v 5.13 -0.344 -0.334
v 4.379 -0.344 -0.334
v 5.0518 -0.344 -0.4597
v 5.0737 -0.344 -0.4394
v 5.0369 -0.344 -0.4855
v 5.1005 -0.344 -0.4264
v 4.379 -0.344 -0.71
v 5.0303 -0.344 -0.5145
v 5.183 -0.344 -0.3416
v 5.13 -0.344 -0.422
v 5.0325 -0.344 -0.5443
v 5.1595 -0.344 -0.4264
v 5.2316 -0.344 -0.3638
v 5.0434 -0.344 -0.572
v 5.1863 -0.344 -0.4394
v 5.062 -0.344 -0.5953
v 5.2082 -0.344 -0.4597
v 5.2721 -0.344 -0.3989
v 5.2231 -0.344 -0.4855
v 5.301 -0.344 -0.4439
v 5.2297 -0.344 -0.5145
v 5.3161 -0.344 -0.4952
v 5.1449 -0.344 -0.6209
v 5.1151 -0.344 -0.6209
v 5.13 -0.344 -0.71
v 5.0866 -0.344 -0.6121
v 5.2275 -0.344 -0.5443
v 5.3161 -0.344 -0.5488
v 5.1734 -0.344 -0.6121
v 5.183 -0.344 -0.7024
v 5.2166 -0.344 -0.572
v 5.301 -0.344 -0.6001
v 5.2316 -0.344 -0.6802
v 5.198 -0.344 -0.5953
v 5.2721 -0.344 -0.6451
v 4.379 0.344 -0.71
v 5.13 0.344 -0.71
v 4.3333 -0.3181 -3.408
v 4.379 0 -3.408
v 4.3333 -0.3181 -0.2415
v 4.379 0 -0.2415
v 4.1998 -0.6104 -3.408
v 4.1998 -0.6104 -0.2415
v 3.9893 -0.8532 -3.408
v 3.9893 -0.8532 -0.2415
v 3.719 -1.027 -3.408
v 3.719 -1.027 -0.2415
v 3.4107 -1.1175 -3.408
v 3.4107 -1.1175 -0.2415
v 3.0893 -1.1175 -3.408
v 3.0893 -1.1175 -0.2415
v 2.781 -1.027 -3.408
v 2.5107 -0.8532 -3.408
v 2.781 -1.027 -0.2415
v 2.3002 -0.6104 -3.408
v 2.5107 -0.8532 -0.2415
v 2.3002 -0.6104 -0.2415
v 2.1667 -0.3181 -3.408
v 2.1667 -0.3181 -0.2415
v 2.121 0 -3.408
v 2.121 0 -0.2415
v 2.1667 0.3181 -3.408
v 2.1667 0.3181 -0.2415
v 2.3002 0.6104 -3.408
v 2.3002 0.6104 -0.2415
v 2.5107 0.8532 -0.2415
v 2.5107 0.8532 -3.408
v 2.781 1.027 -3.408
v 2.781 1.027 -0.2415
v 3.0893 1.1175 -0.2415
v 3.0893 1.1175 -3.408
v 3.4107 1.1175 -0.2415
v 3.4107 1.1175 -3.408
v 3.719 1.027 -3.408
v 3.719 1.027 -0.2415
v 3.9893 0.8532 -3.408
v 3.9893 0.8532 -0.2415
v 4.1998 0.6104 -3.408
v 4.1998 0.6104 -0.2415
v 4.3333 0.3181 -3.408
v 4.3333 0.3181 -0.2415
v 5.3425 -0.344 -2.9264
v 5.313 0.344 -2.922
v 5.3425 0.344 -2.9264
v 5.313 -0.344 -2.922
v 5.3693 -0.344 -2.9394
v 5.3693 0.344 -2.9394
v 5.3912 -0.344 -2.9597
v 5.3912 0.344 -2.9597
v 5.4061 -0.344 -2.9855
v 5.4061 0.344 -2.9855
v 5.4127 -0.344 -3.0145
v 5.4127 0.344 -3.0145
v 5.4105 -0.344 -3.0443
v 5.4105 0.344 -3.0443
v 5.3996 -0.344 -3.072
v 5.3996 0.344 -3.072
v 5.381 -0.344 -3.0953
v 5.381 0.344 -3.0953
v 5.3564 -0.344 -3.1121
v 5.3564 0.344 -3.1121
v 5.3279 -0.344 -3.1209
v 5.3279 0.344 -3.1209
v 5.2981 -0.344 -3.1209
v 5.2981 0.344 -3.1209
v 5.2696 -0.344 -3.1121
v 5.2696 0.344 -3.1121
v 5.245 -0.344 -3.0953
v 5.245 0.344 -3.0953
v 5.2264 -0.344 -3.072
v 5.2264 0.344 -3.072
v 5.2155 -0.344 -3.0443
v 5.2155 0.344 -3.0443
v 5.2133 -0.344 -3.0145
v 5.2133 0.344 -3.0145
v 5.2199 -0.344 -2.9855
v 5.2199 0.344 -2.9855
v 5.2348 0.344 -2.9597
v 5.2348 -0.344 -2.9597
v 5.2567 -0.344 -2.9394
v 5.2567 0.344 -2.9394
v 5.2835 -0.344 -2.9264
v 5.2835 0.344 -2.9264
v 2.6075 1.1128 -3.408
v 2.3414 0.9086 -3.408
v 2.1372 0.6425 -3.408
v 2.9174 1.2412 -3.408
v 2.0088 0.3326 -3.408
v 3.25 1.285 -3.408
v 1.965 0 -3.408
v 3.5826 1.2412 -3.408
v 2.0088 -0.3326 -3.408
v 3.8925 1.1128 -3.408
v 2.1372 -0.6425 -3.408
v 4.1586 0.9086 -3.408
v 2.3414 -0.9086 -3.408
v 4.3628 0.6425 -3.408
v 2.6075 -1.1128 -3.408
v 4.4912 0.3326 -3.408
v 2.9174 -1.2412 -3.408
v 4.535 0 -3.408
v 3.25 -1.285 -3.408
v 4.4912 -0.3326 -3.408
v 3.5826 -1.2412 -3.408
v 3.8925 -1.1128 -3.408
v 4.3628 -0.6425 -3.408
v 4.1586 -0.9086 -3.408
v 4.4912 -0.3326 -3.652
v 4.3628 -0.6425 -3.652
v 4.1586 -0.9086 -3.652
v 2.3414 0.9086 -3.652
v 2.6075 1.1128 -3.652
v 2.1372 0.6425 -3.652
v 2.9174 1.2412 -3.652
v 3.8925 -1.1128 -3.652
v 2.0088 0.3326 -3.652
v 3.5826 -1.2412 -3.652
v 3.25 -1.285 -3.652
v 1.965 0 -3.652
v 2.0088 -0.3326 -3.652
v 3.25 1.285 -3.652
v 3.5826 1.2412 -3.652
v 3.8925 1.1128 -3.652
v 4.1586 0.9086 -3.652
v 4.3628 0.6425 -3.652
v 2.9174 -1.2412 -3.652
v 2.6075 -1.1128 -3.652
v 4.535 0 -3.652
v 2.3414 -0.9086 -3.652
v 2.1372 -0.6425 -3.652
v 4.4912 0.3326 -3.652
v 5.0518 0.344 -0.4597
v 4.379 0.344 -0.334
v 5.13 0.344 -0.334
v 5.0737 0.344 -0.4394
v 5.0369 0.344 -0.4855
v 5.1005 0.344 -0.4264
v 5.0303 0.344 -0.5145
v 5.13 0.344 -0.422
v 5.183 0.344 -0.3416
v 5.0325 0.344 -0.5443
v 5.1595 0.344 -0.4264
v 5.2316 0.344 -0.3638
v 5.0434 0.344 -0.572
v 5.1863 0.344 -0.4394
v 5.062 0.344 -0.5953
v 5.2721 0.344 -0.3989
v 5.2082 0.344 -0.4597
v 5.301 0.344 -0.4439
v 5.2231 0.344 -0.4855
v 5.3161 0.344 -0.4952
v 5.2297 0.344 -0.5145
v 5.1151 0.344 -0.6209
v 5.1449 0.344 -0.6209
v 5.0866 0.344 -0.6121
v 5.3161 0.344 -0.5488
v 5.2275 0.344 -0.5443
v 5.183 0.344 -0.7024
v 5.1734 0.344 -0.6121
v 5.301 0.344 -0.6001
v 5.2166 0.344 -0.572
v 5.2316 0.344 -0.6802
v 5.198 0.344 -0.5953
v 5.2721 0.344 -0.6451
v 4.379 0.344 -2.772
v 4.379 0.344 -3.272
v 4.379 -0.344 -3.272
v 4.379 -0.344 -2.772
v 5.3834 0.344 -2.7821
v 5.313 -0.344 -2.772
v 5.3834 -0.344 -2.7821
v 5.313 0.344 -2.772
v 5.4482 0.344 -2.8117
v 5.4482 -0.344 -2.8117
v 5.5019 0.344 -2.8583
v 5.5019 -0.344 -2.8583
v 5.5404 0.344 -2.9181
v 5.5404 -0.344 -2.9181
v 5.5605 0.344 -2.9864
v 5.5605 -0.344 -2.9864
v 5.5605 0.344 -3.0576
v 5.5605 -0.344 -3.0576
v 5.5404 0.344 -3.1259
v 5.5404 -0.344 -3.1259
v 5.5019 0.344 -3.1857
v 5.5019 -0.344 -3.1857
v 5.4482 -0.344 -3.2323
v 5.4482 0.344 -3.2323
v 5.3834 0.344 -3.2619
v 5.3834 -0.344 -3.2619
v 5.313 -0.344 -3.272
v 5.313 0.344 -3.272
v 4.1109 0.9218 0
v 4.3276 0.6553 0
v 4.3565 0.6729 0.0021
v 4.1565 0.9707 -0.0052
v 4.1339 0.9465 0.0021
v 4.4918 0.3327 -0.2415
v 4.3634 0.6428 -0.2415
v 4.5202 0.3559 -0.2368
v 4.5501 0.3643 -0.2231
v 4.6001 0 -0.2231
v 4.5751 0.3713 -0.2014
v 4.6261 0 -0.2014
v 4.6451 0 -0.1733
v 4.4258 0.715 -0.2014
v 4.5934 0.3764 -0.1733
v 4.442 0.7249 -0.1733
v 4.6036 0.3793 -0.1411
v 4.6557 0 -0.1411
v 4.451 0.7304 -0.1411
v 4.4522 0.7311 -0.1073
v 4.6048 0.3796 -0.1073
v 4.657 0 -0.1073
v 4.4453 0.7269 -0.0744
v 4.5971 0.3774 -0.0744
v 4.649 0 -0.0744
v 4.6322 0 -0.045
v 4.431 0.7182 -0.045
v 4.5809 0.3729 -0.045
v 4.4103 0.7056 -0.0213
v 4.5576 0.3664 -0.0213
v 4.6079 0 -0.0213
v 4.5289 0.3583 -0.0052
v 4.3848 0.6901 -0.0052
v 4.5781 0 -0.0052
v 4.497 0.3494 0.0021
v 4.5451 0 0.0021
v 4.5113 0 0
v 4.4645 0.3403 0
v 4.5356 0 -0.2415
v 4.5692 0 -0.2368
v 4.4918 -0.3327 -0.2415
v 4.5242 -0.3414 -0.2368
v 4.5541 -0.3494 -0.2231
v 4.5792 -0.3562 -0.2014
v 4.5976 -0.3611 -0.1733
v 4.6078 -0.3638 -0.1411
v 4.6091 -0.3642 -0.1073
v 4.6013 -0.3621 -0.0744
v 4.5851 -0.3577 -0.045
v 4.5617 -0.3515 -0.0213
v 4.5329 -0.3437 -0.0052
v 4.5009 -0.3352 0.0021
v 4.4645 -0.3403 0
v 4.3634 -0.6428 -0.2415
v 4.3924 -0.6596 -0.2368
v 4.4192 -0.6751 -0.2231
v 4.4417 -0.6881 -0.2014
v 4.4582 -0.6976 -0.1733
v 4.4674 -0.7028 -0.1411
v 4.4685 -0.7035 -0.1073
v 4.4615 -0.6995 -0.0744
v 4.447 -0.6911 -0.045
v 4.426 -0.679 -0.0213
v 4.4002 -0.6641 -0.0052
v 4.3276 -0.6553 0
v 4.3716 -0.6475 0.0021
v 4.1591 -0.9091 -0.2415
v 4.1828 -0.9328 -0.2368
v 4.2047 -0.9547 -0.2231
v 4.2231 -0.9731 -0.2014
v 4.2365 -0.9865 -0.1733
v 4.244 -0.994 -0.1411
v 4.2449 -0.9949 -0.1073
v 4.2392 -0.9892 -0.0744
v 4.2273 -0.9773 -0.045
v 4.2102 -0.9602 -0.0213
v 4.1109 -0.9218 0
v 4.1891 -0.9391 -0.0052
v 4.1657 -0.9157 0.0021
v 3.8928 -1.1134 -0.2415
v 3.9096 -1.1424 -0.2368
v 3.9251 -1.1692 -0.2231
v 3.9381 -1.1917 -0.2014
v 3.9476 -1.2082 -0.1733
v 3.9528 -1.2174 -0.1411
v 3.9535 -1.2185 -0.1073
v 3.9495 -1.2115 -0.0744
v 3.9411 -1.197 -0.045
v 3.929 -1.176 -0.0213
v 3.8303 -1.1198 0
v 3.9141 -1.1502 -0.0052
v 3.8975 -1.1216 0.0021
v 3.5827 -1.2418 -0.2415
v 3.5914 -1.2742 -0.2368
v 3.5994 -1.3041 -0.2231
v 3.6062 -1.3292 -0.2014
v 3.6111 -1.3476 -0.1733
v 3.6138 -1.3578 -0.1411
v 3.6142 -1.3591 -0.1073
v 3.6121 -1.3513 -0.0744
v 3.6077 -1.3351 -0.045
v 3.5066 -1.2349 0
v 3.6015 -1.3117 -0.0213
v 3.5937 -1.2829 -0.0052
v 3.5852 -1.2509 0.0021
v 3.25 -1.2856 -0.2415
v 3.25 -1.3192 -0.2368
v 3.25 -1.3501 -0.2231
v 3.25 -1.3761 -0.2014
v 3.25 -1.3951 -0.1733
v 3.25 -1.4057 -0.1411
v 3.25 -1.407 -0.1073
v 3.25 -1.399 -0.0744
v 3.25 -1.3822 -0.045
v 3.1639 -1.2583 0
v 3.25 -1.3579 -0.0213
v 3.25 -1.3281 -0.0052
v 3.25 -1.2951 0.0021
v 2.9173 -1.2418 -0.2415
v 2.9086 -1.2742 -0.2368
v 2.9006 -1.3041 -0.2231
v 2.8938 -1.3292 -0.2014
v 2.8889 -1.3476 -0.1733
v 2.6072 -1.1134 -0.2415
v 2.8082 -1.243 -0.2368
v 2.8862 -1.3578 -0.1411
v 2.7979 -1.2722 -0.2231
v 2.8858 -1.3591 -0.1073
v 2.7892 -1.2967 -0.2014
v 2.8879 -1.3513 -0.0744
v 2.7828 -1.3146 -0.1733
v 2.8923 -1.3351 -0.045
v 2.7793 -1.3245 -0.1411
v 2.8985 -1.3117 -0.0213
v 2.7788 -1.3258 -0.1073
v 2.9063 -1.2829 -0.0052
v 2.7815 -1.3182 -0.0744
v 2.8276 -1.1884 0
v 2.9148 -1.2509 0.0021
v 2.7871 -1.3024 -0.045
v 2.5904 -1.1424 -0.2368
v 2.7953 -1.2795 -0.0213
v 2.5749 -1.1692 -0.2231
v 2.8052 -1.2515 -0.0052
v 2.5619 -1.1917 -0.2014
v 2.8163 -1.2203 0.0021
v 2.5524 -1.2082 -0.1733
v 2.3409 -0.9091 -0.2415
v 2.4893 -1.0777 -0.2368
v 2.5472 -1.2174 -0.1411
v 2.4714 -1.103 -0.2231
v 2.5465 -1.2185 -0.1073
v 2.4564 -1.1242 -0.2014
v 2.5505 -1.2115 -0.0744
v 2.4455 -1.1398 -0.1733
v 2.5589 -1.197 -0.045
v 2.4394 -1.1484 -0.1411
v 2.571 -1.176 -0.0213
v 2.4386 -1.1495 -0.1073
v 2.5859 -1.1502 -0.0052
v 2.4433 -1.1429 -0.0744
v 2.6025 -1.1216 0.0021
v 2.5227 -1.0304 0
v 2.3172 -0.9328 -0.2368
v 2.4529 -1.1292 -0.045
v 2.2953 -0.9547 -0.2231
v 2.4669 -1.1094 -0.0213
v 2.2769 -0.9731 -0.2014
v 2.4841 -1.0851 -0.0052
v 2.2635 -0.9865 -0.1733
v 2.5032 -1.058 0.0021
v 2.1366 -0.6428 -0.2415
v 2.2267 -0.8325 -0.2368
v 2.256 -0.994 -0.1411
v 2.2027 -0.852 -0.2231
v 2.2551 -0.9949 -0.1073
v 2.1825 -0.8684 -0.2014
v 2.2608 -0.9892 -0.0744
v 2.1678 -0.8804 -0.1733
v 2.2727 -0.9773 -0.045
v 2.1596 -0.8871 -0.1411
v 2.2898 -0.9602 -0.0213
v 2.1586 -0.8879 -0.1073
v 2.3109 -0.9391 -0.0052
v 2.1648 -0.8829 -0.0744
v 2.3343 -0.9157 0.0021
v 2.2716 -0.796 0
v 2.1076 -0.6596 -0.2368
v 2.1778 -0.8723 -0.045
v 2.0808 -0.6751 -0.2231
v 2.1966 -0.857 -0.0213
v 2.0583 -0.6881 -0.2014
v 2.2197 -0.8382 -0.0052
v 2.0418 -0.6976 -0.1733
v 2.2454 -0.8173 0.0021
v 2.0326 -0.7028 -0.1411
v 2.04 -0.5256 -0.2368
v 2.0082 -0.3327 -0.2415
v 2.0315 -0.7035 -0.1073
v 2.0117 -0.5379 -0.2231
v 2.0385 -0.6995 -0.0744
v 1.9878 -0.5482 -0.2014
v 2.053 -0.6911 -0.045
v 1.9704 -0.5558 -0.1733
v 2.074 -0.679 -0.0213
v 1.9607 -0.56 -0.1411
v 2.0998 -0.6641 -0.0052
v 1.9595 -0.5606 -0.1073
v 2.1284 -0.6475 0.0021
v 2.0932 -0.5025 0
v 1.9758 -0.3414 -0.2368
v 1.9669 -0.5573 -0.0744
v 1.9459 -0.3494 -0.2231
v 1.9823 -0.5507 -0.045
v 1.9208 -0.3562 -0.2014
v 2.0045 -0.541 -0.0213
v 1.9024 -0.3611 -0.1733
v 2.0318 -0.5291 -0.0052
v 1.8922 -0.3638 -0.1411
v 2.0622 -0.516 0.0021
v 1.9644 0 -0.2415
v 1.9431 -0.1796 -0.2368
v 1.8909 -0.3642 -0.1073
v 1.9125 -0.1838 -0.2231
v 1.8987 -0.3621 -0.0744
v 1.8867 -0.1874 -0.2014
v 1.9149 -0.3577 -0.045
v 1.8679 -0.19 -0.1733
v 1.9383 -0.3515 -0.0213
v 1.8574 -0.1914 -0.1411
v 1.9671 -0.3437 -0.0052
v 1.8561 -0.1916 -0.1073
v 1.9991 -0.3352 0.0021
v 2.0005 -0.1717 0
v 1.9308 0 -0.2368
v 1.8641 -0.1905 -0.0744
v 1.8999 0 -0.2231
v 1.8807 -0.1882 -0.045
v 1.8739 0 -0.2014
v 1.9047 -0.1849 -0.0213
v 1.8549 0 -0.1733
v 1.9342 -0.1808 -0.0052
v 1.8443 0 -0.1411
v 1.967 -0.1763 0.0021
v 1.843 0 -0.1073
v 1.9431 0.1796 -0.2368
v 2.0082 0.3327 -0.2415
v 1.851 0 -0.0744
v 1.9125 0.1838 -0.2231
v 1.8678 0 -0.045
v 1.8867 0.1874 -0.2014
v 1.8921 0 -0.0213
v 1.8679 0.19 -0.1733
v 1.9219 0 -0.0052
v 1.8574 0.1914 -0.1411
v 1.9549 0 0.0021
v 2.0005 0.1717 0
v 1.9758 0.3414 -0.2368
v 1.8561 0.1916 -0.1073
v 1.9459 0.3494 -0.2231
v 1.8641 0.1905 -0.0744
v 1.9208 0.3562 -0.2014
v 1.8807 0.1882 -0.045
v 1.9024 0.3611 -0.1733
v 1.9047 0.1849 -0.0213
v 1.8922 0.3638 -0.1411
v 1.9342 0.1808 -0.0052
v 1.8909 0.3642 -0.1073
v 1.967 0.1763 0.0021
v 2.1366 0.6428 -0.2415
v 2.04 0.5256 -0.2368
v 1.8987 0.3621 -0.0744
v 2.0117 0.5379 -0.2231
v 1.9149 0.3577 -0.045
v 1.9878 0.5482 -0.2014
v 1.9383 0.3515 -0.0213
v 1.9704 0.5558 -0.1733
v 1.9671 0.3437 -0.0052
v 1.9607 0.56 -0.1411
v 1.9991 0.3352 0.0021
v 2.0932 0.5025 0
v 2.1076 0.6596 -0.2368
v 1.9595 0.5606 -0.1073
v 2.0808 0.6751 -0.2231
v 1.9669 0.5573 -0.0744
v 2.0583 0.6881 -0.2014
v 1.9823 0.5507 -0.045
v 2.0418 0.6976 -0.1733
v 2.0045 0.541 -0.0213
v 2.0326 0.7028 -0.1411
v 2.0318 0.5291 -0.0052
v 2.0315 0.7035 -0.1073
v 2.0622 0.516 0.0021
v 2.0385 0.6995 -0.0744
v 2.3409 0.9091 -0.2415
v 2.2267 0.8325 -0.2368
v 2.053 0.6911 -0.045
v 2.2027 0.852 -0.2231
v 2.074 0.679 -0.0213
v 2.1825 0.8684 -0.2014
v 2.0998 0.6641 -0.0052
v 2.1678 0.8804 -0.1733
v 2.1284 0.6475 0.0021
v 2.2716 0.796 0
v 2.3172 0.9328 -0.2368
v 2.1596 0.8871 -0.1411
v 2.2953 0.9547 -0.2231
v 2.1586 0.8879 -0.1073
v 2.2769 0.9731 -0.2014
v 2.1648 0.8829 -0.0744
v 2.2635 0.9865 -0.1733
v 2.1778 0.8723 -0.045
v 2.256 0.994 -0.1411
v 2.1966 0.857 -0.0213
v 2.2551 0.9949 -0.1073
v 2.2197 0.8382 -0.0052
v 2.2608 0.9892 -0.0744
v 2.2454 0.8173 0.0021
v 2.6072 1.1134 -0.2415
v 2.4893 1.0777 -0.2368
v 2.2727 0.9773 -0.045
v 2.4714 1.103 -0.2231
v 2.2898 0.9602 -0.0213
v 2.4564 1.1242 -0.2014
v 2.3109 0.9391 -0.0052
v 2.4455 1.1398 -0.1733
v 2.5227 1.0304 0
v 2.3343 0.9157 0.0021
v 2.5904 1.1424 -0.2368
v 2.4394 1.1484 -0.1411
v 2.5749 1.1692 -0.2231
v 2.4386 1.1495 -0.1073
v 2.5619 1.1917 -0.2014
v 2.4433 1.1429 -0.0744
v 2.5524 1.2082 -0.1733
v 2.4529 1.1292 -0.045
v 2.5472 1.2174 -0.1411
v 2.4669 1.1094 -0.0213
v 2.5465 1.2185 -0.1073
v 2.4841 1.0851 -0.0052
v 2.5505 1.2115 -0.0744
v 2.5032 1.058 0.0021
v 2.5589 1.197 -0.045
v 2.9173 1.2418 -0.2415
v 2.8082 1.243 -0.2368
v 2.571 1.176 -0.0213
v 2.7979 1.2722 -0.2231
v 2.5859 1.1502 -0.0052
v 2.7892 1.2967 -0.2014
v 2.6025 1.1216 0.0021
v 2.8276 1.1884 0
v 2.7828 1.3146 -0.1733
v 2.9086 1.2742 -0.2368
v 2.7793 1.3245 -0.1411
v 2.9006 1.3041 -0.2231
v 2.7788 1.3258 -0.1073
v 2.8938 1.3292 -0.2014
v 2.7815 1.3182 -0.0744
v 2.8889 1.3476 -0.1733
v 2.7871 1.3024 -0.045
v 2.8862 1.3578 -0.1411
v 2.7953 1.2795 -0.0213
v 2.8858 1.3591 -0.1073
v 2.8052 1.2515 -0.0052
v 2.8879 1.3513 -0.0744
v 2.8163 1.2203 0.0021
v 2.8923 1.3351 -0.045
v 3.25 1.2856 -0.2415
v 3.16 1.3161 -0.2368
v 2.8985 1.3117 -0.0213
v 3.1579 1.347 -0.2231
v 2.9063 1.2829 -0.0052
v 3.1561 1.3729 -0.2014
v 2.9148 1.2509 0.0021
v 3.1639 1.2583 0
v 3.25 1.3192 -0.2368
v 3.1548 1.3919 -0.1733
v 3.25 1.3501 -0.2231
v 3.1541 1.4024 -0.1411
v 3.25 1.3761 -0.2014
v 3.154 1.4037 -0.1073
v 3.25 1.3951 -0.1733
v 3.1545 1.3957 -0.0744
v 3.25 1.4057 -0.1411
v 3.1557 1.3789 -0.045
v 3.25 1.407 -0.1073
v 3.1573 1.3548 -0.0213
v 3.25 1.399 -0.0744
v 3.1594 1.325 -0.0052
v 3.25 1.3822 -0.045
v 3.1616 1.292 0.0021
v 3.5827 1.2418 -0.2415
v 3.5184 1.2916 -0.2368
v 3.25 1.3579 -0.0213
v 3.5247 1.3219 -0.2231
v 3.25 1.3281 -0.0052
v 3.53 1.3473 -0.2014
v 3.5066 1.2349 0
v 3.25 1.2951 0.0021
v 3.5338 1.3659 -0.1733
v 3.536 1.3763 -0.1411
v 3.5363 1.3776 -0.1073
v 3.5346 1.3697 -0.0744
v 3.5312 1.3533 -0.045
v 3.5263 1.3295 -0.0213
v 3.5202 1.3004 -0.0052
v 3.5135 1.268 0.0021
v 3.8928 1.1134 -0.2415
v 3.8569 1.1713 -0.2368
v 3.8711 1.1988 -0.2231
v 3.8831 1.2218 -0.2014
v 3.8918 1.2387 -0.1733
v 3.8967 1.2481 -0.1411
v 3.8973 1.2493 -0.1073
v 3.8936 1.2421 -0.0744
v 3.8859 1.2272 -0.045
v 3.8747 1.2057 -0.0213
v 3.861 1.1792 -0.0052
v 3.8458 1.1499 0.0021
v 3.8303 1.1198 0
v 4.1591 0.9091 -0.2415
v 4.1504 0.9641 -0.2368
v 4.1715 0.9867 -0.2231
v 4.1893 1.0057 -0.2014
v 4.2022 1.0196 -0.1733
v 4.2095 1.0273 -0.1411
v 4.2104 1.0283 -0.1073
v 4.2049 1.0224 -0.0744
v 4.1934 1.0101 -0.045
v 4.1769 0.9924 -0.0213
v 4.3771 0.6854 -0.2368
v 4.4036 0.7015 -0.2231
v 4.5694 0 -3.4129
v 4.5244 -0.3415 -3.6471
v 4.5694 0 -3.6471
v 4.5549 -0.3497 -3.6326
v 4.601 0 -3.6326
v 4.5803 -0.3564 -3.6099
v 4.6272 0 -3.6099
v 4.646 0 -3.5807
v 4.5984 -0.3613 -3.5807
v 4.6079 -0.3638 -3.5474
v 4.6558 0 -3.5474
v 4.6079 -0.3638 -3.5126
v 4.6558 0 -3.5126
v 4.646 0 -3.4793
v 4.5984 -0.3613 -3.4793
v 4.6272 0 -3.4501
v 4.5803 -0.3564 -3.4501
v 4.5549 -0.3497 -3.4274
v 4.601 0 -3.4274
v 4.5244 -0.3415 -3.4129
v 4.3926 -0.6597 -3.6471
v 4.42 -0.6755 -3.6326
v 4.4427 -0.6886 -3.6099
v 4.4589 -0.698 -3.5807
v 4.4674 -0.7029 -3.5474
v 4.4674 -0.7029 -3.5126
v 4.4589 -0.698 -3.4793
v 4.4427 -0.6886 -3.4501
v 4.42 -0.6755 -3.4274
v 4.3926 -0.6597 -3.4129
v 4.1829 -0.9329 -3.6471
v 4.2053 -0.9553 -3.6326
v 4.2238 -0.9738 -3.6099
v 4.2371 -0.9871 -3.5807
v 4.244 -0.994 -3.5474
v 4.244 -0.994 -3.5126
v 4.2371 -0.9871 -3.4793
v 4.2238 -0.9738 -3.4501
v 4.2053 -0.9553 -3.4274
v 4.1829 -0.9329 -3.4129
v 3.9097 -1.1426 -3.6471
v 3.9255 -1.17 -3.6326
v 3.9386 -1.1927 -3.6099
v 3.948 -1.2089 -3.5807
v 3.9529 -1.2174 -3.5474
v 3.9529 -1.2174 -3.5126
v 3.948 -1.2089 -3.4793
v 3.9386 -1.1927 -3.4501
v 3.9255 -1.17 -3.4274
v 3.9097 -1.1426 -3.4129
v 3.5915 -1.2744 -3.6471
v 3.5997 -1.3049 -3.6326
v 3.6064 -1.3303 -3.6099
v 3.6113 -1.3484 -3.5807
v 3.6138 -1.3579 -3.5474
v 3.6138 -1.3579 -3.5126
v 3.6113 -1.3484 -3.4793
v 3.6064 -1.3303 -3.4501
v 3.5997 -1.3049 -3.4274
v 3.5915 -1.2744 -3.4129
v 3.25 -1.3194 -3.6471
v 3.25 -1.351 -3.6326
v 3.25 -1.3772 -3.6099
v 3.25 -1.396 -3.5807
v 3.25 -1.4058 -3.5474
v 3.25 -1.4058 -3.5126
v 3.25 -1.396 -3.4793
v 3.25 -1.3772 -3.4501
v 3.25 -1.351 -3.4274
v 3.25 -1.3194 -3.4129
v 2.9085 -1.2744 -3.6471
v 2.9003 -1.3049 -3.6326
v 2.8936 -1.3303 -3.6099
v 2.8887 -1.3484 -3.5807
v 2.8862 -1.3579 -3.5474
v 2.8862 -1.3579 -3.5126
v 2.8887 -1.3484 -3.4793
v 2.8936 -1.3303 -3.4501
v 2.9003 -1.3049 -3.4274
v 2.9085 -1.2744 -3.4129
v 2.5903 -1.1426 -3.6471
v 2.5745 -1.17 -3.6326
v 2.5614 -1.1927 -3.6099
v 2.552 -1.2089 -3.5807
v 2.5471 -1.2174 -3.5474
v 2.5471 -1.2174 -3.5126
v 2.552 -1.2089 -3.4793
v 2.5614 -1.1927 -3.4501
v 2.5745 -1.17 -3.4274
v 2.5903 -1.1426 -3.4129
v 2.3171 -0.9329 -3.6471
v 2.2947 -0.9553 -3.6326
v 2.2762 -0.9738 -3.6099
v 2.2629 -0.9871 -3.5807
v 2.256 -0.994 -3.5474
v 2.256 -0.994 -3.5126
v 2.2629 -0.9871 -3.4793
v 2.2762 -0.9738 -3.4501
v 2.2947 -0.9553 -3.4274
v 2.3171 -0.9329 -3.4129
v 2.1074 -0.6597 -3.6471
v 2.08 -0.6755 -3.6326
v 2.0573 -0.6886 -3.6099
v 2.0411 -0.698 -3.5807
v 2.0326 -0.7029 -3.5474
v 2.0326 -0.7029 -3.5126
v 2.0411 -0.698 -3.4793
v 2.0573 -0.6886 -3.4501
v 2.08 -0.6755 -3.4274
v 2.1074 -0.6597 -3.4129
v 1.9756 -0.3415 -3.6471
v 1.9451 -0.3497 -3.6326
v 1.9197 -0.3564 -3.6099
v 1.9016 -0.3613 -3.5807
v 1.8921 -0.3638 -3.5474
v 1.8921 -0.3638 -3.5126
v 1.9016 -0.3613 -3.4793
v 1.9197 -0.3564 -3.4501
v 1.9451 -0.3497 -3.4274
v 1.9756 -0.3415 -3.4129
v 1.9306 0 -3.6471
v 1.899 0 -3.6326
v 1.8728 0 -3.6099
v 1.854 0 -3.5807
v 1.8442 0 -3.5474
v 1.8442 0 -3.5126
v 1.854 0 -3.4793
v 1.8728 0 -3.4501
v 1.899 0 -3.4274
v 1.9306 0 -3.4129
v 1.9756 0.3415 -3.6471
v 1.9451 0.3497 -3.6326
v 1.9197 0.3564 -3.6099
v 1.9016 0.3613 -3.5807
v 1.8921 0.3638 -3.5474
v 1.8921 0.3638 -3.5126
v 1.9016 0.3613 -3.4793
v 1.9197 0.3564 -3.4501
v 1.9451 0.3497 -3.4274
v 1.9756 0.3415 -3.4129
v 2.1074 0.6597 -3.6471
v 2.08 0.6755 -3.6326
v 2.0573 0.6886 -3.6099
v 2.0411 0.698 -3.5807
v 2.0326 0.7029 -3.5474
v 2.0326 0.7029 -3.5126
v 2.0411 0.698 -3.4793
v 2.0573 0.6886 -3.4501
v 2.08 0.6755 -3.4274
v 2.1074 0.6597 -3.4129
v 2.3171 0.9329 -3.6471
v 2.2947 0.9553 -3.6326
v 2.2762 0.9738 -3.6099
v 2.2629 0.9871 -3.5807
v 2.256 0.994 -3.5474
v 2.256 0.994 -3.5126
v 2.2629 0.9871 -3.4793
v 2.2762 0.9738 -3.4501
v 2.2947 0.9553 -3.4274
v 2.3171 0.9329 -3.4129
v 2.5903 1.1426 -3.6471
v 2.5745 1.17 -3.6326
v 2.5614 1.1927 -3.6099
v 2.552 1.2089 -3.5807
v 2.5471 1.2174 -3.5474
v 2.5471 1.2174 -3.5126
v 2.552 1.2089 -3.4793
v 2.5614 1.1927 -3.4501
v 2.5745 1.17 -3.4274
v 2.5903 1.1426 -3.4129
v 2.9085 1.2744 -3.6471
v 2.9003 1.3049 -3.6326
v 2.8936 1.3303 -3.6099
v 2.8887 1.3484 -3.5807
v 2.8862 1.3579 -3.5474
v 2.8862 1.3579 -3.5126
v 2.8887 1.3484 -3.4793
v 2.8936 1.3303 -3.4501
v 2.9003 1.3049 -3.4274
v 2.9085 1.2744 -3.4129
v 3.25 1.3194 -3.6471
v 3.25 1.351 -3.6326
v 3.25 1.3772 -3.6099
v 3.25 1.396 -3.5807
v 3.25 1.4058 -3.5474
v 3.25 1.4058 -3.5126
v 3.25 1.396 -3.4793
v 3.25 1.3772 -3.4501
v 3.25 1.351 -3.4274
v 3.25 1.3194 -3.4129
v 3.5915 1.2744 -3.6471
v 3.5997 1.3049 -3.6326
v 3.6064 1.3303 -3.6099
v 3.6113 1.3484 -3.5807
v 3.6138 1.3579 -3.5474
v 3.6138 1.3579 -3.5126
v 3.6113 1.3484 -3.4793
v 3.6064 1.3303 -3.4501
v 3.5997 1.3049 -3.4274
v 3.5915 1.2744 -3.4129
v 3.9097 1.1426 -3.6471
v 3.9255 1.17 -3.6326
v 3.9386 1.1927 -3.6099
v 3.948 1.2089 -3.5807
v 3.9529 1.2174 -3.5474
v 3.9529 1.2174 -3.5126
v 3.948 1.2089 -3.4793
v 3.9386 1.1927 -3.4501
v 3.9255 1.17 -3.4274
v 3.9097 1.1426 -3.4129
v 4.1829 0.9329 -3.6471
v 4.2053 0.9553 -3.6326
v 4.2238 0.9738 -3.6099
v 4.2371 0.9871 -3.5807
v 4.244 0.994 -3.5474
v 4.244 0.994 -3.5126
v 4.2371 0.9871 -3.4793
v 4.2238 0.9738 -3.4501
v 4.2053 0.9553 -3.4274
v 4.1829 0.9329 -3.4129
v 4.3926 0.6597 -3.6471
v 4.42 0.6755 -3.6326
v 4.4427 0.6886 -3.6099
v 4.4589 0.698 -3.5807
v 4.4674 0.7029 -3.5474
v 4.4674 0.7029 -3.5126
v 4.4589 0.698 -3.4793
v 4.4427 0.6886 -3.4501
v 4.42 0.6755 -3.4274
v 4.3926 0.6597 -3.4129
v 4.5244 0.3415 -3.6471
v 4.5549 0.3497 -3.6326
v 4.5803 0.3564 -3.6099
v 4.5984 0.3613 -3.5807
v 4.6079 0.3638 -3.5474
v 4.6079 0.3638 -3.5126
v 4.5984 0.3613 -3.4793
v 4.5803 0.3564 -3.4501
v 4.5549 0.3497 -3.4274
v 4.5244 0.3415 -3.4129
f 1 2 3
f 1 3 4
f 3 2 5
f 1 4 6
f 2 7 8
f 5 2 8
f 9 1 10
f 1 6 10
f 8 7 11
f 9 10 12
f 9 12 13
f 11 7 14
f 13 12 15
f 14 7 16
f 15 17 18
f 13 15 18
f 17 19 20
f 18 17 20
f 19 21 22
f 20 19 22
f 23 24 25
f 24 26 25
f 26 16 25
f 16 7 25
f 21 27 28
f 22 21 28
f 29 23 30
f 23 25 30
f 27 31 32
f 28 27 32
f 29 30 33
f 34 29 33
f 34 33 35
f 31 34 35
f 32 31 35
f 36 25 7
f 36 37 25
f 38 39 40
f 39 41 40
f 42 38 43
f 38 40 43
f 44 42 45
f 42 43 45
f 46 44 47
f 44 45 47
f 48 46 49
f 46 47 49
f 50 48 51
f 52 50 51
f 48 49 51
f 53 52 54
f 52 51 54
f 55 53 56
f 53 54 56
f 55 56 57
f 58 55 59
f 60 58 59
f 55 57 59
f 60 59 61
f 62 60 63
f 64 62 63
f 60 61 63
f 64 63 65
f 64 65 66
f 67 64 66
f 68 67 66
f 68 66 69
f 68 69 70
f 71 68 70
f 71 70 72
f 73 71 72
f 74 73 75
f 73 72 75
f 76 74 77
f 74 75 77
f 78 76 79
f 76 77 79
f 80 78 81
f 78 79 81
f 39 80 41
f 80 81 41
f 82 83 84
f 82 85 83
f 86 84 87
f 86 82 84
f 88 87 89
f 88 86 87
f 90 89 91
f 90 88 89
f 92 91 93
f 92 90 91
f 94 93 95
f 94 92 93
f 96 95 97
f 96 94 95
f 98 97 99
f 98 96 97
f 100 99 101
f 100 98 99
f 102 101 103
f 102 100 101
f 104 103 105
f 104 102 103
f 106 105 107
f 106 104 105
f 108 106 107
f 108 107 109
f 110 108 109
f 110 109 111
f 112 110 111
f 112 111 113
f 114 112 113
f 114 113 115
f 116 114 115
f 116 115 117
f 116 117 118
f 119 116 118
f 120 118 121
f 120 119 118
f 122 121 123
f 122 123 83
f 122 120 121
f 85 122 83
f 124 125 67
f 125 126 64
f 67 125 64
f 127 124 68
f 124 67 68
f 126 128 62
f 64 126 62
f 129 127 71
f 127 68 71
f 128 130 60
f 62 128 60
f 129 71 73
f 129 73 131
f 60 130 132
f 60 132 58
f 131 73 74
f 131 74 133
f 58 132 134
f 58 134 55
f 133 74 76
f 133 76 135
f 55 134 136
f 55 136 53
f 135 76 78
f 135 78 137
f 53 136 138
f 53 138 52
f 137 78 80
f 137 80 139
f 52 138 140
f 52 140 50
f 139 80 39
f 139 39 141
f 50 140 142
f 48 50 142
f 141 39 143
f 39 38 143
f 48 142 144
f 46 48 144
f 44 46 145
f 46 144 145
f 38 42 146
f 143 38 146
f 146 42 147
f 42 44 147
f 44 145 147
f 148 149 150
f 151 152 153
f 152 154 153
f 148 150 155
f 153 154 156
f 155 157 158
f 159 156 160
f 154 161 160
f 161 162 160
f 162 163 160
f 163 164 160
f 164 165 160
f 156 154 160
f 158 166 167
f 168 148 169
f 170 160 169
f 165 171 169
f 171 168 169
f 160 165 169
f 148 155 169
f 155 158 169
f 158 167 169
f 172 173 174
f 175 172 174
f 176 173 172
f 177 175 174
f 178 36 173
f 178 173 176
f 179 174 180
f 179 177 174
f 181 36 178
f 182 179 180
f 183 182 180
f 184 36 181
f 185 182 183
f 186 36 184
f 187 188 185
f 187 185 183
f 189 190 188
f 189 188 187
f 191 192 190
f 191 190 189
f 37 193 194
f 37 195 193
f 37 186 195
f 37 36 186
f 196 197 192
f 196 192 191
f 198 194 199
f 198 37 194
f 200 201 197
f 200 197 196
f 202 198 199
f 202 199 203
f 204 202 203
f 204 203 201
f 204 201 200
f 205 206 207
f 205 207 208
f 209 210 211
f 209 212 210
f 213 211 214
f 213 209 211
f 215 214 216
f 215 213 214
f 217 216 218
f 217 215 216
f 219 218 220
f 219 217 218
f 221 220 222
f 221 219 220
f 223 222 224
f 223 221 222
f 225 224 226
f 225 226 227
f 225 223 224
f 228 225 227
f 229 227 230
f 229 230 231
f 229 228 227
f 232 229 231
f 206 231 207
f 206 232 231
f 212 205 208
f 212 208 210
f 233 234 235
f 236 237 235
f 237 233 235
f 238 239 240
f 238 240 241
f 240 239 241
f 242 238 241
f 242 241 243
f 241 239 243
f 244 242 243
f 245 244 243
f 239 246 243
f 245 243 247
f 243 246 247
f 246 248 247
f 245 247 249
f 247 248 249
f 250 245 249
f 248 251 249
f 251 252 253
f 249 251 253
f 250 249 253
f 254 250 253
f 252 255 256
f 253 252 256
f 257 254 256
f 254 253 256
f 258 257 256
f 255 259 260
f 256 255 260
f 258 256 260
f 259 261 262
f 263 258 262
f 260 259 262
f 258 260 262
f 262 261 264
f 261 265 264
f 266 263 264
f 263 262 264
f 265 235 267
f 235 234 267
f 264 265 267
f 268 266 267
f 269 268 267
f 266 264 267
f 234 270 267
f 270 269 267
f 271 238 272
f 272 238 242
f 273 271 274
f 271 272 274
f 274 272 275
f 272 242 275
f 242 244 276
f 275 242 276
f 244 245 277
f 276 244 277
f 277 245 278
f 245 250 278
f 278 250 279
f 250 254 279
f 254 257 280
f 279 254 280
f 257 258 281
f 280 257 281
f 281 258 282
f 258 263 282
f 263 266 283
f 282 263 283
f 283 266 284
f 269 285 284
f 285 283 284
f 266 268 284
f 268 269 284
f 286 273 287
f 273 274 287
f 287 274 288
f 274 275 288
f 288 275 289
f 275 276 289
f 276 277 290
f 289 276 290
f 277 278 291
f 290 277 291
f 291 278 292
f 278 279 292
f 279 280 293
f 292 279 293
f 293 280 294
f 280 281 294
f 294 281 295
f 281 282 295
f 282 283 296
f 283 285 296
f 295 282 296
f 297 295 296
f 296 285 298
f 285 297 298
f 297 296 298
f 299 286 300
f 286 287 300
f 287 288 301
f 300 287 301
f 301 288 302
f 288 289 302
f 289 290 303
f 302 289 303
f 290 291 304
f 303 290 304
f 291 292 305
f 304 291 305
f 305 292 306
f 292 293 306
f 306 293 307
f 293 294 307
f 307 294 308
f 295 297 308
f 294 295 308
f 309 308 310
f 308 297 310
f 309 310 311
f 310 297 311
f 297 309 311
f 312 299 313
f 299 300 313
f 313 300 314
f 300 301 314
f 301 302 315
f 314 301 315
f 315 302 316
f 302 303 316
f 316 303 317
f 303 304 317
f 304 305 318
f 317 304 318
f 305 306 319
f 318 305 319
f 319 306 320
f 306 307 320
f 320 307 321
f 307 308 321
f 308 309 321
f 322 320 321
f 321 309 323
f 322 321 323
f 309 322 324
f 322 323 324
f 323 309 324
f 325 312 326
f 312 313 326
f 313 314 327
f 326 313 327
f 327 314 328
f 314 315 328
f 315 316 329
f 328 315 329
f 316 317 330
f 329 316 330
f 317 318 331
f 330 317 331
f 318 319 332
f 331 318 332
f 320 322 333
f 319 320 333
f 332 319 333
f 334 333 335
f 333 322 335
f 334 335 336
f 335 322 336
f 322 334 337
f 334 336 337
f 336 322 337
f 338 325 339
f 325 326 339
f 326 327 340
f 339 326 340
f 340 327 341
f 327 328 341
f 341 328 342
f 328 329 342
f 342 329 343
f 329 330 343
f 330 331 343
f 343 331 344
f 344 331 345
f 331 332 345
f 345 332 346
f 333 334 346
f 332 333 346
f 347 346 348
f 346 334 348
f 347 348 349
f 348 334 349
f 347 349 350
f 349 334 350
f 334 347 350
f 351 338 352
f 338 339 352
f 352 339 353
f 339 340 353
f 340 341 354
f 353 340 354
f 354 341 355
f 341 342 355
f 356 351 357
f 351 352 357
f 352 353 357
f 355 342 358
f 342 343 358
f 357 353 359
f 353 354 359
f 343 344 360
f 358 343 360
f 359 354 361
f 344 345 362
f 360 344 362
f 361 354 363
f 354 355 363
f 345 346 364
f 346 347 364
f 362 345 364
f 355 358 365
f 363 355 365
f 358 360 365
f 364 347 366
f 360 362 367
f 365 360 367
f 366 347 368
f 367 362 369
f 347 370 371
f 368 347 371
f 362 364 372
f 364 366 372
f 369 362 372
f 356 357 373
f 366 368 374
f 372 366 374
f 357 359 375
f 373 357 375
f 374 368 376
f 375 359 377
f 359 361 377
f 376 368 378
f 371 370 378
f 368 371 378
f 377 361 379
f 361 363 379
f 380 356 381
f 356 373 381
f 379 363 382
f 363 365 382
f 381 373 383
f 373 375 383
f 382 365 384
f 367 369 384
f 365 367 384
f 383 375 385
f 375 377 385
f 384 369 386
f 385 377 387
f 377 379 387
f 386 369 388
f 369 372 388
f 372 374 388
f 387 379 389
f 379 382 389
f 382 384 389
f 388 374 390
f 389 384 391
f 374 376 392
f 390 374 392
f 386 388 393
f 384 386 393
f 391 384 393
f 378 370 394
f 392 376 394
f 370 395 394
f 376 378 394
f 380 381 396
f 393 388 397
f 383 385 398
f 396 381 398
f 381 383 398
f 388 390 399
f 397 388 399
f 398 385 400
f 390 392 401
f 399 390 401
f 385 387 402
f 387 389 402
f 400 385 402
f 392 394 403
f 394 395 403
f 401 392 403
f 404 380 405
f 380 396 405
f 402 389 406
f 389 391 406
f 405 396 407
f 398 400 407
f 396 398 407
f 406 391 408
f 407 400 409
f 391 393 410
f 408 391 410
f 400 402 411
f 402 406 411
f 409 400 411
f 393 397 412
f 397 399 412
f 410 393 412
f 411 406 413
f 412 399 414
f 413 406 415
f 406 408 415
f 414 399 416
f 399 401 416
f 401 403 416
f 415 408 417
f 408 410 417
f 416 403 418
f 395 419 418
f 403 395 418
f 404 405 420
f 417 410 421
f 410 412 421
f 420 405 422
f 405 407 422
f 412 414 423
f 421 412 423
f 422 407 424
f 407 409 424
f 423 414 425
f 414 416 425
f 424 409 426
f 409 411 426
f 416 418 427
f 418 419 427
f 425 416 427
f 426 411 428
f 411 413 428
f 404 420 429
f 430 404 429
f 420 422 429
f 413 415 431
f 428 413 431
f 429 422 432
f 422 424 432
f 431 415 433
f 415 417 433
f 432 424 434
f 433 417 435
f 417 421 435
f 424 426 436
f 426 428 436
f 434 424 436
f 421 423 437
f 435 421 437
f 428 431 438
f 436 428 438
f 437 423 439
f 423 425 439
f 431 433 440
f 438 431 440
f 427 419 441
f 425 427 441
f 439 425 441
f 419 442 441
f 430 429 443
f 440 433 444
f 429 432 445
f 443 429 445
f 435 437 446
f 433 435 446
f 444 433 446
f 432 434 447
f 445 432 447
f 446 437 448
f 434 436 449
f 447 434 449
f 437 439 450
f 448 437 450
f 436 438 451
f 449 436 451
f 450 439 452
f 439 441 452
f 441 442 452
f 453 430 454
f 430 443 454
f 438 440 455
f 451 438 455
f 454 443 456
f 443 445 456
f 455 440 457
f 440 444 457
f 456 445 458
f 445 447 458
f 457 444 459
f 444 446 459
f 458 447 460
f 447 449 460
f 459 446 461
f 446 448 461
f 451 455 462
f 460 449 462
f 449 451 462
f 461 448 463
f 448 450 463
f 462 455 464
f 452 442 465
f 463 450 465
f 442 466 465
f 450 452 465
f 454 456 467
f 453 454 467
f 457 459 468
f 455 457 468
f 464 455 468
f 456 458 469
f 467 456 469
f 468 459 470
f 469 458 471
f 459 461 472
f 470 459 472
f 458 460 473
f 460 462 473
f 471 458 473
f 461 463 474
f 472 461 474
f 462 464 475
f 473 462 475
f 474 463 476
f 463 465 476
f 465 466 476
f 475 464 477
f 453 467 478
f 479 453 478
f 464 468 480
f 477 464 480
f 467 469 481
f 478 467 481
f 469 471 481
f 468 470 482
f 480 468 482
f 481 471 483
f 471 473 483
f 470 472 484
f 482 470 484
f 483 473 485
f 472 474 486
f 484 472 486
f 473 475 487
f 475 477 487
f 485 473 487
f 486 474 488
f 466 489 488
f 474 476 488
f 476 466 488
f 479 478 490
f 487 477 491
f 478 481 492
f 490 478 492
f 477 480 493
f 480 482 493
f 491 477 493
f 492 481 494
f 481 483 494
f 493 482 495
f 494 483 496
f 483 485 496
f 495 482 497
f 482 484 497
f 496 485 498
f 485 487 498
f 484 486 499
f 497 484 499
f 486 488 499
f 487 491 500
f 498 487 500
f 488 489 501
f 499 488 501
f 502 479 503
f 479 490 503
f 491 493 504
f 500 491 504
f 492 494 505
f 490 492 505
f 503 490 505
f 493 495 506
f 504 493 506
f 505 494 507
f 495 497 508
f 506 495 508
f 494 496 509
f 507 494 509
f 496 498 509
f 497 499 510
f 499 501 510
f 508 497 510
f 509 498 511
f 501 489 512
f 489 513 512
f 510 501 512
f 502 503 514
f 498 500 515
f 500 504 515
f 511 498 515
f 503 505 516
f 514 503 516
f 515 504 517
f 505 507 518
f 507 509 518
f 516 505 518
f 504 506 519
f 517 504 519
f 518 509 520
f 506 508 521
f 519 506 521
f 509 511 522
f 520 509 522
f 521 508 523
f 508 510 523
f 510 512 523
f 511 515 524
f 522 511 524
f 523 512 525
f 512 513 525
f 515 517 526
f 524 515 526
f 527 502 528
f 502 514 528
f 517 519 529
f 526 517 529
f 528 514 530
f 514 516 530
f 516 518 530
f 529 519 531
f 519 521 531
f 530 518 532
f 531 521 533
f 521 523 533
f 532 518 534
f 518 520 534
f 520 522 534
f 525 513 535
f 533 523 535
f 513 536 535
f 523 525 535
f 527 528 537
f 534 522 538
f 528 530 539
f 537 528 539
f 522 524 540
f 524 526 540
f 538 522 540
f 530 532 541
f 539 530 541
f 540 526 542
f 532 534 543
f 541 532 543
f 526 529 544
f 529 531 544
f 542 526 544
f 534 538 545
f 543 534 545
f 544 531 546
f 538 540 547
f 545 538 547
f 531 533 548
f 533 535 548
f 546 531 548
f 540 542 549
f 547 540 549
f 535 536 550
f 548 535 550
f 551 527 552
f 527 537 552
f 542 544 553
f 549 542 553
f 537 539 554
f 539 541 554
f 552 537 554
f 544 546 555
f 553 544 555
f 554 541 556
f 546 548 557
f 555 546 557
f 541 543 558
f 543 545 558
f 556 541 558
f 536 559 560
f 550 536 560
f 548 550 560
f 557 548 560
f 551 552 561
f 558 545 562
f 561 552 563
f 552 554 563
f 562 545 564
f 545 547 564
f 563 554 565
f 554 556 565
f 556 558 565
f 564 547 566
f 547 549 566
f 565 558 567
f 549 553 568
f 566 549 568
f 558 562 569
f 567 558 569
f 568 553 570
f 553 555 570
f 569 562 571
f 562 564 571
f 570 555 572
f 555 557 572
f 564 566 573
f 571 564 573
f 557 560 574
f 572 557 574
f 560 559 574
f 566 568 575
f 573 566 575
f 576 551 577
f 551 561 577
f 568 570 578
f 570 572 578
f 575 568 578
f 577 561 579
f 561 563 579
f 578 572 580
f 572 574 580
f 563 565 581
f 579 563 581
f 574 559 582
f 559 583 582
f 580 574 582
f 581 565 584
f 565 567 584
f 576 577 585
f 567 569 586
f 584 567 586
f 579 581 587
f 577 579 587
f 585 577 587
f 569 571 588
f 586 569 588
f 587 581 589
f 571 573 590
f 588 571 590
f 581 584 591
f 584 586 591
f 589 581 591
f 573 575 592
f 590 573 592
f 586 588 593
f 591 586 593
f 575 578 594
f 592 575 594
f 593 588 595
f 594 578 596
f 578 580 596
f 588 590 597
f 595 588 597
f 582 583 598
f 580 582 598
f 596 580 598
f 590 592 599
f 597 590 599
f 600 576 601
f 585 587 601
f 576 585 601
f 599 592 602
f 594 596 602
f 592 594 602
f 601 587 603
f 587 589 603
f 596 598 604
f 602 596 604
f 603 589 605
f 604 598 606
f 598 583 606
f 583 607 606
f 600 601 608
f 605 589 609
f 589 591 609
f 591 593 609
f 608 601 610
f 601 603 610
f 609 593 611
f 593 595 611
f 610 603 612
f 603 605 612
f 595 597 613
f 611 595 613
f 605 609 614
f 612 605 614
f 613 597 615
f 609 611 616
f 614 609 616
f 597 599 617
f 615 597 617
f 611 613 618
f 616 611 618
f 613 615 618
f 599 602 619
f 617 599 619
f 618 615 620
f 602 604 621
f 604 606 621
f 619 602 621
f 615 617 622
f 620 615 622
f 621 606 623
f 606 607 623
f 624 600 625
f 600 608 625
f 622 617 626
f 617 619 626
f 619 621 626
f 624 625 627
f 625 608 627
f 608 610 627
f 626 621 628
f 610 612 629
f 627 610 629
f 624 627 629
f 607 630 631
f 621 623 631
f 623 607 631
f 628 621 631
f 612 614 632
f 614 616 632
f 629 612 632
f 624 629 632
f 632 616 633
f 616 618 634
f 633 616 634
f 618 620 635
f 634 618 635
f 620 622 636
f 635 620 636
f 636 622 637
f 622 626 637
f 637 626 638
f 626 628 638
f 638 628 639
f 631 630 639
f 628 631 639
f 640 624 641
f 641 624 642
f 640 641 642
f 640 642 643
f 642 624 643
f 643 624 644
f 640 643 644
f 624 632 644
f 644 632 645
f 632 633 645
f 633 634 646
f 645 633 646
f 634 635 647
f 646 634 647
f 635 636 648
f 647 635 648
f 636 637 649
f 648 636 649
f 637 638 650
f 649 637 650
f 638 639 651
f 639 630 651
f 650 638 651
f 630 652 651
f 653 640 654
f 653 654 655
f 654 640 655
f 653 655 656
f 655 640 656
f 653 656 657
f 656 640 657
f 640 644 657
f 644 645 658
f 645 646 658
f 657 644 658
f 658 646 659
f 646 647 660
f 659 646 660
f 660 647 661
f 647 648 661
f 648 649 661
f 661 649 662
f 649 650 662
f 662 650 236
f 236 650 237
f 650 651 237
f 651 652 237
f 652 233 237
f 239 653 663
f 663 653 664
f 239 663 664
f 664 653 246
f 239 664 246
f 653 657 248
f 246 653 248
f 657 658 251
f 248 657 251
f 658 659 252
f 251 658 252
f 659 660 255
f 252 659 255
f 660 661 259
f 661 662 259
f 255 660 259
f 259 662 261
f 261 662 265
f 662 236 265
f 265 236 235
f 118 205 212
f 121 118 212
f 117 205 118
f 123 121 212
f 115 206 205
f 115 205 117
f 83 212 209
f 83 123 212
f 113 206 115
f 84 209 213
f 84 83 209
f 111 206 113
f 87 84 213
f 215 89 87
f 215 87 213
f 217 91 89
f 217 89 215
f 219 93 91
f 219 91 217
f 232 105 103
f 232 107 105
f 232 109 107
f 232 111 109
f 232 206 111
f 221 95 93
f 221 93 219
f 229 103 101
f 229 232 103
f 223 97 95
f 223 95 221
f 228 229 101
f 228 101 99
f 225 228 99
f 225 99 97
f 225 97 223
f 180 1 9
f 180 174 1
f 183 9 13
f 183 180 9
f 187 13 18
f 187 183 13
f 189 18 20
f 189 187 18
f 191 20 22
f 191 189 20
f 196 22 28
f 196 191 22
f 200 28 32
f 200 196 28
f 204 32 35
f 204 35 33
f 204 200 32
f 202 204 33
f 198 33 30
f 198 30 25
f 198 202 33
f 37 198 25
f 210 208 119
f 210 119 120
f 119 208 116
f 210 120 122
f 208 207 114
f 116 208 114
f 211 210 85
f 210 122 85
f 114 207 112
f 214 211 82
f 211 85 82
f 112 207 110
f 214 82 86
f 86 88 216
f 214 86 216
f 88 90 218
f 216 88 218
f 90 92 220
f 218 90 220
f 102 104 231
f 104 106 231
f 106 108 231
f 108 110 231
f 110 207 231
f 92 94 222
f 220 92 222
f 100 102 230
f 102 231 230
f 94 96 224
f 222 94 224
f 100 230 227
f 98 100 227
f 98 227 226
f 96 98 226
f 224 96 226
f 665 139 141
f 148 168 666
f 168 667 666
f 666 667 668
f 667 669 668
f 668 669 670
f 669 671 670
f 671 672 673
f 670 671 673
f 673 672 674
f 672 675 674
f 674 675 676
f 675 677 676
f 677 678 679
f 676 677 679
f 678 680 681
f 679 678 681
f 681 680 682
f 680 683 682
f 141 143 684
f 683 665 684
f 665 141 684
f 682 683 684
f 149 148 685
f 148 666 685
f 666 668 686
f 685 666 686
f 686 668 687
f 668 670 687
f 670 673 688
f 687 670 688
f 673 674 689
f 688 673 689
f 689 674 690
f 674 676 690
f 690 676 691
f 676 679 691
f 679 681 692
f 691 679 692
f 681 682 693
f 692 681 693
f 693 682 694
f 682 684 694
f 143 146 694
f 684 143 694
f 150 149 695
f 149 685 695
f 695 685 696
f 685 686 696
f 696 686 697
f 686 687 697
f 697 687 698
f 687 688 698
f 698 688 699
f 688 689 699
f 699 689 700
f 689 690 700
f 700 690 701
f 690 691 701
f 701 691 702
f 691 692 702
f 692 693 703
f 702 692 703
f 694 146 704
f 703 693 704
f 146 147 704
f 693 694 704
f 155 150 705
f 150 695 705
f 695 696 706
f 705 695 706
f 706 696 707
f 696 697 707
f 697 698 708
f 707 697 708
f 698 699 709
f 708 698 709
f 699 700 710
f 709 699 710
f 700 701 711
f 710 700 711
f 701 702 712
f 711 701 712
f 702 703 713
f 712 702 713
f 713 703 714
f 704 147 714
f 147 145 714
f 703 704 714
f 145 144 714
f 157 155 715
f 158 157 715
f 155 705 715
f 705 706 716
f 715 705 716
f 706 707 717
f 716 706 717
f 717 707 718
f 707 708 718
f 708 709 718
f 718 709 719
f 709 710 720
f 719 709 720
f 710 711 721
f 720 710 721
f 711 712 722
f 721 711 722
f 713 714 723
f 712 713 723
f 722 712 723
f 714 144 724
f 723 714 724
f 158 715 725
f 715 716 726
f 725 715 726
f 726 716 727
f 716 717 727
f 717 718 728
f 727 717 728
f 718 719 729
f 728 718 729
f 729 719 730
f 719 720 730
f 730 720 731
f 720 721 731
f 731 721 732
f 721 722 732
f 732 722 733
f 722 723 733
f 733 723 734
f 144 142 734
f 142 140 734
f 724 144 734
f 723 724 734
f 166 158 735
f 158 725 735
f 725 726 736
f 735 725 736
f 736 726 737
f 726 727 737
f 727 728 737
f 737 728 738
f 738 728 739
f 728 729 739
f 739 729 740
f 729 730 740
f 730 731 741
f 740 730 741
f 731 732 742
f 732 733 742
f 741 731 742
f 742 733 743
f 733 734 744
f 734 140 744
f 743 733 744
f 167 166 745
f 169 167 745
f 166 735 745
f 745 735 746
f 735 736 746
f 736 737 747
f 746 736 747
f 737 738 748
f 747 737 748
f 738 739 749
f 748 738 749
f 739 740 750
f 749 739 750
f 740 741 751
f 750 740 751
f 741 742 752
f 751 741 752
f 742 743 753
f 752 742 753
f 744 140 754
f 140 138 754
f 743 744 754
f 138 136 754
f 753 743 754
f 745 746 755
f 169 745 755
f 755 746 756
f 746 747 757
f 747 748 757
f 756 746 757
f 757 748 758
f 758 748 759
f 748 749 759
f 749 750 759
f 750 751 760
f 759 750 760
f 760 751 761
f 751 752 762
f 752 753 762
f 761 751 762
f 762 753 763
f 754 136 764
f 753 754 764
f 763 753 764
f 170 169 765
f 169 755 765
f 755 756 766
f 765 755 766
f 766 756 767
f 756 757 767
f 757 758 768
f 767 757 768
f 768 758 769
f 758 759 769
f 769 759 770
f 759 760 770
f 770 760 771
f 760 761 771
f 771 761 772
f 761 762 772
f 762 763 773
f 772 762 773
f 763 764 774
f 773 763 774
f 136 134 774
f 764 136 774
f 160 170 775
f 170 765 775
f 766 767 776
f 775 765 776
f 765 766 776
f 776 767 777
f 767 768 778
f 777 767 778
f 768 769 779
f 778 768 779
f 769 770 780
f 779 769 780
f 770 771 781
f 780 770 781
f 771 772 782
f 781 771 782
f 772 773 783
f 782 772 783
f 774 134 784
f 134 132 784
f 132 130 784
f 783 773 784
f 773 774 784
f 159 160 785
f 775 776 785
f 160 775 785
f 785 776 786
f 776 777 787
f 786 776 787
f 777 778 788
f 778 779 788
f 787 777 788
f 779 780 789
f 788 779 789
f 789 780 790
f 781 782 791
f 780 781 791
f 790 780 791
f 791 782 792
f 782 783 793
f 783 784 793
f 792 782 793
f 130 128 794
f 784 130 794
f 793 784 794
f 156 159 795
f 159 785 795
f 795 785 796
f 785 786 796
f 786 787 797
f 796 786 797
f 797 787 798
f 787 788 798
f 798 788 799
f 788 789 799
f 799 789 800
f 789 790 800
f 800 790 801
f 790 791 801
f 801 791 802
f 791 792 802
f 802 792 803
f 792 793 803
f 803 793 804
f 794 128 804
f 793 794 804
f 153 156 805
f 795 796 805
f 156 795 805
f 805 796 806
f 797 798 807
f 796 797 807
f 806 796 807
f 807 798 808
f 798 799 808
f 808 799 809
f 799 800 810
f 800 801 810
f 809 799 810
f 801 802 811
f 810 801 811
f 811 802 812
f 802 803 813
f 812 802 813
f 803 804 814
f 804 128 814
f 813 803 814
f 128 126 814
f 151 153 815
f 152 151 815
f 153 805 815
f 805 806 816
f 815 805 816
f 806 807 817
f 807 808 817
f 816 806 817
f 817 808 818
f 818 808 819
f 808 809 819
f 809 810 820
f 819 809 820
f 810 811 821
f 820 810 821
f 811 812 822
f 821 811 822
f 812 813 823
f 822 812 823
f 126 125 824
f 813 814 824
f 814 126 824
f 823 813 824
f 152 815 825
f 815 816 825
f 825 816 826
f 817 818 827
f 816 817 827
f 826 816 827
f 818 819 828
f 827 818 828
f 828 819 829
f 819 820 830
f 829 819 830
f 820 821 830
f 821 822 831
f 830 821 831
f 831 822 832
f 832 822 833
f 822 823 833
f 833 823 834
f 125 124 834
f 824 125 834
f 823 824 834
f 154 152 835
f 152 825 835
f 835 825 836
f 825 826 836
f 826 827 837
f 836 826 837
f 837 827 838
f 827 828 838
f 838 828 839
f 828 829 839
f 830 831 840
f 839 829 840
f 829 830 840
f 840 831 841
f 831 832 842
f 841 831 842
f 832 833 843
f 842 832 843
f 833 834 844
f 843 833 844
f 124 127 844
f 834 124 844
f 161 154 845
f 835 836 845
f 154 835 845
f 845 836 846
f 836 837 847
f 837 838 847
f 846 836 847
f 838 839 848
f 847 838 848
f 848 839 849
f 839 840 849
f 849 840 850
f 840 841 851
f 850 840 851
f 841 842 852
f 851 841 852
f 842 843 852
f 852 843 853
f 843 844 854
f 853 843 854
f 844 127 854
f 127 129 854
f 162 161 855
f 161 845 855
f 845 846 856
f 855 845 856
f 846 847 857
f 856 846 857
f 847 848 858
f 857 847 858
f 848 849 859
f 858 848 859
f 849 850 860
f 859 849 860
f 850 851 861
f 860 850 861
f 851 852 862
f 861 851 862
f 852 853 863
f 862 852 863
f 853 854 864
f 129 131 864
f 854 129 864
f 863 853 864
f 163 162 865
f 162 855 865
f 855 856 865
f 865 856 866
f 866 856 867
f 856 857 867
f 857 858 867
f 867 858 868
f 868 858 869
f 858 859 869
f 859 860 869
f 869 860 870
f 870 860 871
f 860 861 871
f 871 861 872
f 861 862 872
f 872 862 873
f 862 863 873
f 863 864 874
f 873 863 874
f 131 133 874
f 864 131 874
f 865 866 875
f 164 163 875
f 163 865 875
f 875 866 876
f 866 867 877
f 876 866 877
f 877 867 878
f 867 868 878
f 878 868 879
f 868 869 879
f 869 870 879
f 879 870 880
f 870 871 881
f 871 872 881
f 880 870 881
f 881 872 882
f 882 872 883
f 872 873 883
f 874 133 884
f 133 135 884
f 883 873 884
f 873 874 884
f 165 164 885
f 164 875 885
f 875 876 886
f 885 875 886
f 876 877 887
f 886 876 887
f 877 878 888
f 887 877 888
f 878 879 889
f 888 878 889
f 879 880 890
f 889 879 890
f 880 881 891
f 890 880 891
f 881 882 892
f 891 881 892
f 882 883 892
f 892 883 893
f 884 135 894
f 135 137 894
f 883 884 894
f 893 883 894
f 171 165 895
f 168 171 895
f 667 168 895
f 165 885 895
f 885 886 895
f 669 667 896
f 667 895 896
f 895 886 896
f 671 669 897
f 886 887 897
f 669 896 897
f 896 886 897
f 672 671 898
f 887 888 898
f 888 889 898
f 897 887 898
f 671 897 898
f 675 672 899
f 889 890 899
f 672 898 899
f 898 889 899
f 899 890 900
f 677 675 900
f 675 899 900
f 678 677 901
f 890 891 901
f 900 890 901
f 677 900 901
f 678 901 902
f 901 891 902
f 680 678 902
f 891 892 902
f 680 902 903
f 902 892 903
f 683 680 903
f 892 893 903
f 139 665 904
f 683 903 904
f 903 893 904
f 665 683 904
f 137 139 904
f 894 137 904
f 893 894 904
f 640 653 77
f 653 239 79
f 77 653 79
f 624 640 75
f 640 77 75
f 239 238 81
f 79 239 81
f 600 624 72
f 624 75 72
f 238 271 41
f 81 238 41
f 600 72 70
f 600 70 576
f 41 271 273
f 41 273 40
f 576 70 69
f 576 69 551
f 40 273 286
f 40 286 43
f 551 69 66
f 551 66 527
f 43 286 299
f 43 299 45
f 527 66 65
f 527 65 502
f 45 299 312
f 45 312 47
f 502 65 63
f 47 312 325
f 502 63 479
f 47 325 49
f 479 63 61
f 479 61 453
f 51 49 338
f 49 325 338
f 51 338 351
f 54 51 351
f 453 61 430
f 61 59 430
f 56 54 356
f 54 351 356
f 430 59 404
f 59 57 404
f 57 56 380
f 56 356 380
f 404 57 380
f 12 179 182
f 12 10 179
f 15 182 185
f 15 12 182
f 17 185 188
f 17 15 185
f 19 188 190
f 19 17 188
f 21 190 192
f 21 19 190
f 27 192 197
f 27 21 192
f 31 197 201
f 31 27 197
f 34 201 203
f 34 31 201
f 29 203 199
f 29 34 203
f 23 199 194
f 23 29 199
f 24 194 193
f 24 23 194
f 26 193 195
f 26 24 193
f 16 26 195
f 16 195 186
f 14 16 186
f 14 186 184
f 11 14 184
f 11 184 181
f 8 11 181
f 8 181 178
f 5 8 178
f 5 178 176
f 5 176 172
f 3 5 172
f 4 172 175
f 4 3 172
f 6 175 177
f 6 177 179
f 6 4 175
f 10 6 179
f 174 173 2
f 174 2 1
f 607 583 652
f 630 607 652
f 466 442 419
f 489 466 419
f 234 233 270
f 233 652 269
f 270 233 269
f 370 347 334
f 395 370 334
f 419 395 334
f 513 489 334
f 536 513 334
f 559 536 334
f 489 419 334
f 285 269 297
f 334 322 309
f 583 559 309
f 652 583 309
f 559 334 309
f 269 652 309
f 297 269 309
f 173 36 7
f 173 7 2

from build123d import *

# Parameters (mm, degrees)
SKETCH3_R             = 0.1
BOSS_EXTRUDE2_DEPTH   = 0.344
BOSS_EXTRUDE2_2_DEPTH = 0.344


with BuildPart() as part:
    # Sketch1 → Revolve3 (revolve)
    with BuildSketch(Plane(origin=(0, 0, 0), x_dir=(1, 0, 0), z_dir=(0, 1, 0))):
        with BuildLine():
            Line((4.535, 3.408), (4.379, 3.408))
            Line((4.379, 3.408), (4.379, 0.24154255))
            Line((4.379, 0.24154255), (4.535615917, 0.24154255))
            ThreePointArc((4.535615917, 0.24154255), (4.657, 0.107299003), (4.511252446, 0))
            Line((4.511252446, 0), (3.25, 0))
            Line((3.25, 0), (3.25, 3.652))
            Line((3.25, 3.652), (4.535, 3.652))
            ThreePointArc((4.535, 3.652), (4.657, 3.53), (4.535, 3.408))
        make_face()
    revolve(axis=Axis((3.25, 0, 0), (0, 0, -1)))


with BuildPart() as body_2:
    # Sketch3 → Boss-Extrude2 (new, symmetric)
    with BuildSketch(Plane(origin=(0, 0, 0), x_dir=(1, 0, 0), z_dir=(0, 1, 0))):
        with BuildLine():
            Line((5.13, 0.71), (4.379, 0.71))
            Line((4.379, 0.71), (4.379, 0.334))
            Line((4.379, 0.334), (5.13, 0.334))
            ThreePointArc((5.13, 0.334), (5.318, 0.522), (5.13, 0.71))
        make_face()
        with Locations(Location((5.13, 0.522, 0), (0, 0, 270))):
            Circle(SKETCH3_R, mode=Mode.SUBTRACT)
    extrude(amount=BOSS_EXTRUDE2_DEPTH, both=True)


with BuildPart() as body_3:
    # Sketch3 → Boss-Extrude2 2 (new, symmetric)
    with BuildSketch(Plane(origin=(0, 0, 0), x_dir=(1, 0, 0), z_dir=(0, 1, 0))):
        with BuildLine():
            Line((5.313, 3.272), (4.379, 3.272))
            Line((4.379, 3.272), (4.379, 2.772))
            Line((4.379, 2.772), (5.313, 2.772))
            ThreePointArc((5.313, 2.772), (5.563, 3.022), (5.313, 3.272))
        make_face()
        with Locations(Location((5.313, 3.022, 0), (0, 0, 270))):
            Circle(SKETCH3_R, mode=Mode.SUBTRACT)
    extrude(amount=BOSS_EXTRUDE2_2_DEPTH, both=True)


solid = Compound([part.part, body_2.part, body_3.part])
